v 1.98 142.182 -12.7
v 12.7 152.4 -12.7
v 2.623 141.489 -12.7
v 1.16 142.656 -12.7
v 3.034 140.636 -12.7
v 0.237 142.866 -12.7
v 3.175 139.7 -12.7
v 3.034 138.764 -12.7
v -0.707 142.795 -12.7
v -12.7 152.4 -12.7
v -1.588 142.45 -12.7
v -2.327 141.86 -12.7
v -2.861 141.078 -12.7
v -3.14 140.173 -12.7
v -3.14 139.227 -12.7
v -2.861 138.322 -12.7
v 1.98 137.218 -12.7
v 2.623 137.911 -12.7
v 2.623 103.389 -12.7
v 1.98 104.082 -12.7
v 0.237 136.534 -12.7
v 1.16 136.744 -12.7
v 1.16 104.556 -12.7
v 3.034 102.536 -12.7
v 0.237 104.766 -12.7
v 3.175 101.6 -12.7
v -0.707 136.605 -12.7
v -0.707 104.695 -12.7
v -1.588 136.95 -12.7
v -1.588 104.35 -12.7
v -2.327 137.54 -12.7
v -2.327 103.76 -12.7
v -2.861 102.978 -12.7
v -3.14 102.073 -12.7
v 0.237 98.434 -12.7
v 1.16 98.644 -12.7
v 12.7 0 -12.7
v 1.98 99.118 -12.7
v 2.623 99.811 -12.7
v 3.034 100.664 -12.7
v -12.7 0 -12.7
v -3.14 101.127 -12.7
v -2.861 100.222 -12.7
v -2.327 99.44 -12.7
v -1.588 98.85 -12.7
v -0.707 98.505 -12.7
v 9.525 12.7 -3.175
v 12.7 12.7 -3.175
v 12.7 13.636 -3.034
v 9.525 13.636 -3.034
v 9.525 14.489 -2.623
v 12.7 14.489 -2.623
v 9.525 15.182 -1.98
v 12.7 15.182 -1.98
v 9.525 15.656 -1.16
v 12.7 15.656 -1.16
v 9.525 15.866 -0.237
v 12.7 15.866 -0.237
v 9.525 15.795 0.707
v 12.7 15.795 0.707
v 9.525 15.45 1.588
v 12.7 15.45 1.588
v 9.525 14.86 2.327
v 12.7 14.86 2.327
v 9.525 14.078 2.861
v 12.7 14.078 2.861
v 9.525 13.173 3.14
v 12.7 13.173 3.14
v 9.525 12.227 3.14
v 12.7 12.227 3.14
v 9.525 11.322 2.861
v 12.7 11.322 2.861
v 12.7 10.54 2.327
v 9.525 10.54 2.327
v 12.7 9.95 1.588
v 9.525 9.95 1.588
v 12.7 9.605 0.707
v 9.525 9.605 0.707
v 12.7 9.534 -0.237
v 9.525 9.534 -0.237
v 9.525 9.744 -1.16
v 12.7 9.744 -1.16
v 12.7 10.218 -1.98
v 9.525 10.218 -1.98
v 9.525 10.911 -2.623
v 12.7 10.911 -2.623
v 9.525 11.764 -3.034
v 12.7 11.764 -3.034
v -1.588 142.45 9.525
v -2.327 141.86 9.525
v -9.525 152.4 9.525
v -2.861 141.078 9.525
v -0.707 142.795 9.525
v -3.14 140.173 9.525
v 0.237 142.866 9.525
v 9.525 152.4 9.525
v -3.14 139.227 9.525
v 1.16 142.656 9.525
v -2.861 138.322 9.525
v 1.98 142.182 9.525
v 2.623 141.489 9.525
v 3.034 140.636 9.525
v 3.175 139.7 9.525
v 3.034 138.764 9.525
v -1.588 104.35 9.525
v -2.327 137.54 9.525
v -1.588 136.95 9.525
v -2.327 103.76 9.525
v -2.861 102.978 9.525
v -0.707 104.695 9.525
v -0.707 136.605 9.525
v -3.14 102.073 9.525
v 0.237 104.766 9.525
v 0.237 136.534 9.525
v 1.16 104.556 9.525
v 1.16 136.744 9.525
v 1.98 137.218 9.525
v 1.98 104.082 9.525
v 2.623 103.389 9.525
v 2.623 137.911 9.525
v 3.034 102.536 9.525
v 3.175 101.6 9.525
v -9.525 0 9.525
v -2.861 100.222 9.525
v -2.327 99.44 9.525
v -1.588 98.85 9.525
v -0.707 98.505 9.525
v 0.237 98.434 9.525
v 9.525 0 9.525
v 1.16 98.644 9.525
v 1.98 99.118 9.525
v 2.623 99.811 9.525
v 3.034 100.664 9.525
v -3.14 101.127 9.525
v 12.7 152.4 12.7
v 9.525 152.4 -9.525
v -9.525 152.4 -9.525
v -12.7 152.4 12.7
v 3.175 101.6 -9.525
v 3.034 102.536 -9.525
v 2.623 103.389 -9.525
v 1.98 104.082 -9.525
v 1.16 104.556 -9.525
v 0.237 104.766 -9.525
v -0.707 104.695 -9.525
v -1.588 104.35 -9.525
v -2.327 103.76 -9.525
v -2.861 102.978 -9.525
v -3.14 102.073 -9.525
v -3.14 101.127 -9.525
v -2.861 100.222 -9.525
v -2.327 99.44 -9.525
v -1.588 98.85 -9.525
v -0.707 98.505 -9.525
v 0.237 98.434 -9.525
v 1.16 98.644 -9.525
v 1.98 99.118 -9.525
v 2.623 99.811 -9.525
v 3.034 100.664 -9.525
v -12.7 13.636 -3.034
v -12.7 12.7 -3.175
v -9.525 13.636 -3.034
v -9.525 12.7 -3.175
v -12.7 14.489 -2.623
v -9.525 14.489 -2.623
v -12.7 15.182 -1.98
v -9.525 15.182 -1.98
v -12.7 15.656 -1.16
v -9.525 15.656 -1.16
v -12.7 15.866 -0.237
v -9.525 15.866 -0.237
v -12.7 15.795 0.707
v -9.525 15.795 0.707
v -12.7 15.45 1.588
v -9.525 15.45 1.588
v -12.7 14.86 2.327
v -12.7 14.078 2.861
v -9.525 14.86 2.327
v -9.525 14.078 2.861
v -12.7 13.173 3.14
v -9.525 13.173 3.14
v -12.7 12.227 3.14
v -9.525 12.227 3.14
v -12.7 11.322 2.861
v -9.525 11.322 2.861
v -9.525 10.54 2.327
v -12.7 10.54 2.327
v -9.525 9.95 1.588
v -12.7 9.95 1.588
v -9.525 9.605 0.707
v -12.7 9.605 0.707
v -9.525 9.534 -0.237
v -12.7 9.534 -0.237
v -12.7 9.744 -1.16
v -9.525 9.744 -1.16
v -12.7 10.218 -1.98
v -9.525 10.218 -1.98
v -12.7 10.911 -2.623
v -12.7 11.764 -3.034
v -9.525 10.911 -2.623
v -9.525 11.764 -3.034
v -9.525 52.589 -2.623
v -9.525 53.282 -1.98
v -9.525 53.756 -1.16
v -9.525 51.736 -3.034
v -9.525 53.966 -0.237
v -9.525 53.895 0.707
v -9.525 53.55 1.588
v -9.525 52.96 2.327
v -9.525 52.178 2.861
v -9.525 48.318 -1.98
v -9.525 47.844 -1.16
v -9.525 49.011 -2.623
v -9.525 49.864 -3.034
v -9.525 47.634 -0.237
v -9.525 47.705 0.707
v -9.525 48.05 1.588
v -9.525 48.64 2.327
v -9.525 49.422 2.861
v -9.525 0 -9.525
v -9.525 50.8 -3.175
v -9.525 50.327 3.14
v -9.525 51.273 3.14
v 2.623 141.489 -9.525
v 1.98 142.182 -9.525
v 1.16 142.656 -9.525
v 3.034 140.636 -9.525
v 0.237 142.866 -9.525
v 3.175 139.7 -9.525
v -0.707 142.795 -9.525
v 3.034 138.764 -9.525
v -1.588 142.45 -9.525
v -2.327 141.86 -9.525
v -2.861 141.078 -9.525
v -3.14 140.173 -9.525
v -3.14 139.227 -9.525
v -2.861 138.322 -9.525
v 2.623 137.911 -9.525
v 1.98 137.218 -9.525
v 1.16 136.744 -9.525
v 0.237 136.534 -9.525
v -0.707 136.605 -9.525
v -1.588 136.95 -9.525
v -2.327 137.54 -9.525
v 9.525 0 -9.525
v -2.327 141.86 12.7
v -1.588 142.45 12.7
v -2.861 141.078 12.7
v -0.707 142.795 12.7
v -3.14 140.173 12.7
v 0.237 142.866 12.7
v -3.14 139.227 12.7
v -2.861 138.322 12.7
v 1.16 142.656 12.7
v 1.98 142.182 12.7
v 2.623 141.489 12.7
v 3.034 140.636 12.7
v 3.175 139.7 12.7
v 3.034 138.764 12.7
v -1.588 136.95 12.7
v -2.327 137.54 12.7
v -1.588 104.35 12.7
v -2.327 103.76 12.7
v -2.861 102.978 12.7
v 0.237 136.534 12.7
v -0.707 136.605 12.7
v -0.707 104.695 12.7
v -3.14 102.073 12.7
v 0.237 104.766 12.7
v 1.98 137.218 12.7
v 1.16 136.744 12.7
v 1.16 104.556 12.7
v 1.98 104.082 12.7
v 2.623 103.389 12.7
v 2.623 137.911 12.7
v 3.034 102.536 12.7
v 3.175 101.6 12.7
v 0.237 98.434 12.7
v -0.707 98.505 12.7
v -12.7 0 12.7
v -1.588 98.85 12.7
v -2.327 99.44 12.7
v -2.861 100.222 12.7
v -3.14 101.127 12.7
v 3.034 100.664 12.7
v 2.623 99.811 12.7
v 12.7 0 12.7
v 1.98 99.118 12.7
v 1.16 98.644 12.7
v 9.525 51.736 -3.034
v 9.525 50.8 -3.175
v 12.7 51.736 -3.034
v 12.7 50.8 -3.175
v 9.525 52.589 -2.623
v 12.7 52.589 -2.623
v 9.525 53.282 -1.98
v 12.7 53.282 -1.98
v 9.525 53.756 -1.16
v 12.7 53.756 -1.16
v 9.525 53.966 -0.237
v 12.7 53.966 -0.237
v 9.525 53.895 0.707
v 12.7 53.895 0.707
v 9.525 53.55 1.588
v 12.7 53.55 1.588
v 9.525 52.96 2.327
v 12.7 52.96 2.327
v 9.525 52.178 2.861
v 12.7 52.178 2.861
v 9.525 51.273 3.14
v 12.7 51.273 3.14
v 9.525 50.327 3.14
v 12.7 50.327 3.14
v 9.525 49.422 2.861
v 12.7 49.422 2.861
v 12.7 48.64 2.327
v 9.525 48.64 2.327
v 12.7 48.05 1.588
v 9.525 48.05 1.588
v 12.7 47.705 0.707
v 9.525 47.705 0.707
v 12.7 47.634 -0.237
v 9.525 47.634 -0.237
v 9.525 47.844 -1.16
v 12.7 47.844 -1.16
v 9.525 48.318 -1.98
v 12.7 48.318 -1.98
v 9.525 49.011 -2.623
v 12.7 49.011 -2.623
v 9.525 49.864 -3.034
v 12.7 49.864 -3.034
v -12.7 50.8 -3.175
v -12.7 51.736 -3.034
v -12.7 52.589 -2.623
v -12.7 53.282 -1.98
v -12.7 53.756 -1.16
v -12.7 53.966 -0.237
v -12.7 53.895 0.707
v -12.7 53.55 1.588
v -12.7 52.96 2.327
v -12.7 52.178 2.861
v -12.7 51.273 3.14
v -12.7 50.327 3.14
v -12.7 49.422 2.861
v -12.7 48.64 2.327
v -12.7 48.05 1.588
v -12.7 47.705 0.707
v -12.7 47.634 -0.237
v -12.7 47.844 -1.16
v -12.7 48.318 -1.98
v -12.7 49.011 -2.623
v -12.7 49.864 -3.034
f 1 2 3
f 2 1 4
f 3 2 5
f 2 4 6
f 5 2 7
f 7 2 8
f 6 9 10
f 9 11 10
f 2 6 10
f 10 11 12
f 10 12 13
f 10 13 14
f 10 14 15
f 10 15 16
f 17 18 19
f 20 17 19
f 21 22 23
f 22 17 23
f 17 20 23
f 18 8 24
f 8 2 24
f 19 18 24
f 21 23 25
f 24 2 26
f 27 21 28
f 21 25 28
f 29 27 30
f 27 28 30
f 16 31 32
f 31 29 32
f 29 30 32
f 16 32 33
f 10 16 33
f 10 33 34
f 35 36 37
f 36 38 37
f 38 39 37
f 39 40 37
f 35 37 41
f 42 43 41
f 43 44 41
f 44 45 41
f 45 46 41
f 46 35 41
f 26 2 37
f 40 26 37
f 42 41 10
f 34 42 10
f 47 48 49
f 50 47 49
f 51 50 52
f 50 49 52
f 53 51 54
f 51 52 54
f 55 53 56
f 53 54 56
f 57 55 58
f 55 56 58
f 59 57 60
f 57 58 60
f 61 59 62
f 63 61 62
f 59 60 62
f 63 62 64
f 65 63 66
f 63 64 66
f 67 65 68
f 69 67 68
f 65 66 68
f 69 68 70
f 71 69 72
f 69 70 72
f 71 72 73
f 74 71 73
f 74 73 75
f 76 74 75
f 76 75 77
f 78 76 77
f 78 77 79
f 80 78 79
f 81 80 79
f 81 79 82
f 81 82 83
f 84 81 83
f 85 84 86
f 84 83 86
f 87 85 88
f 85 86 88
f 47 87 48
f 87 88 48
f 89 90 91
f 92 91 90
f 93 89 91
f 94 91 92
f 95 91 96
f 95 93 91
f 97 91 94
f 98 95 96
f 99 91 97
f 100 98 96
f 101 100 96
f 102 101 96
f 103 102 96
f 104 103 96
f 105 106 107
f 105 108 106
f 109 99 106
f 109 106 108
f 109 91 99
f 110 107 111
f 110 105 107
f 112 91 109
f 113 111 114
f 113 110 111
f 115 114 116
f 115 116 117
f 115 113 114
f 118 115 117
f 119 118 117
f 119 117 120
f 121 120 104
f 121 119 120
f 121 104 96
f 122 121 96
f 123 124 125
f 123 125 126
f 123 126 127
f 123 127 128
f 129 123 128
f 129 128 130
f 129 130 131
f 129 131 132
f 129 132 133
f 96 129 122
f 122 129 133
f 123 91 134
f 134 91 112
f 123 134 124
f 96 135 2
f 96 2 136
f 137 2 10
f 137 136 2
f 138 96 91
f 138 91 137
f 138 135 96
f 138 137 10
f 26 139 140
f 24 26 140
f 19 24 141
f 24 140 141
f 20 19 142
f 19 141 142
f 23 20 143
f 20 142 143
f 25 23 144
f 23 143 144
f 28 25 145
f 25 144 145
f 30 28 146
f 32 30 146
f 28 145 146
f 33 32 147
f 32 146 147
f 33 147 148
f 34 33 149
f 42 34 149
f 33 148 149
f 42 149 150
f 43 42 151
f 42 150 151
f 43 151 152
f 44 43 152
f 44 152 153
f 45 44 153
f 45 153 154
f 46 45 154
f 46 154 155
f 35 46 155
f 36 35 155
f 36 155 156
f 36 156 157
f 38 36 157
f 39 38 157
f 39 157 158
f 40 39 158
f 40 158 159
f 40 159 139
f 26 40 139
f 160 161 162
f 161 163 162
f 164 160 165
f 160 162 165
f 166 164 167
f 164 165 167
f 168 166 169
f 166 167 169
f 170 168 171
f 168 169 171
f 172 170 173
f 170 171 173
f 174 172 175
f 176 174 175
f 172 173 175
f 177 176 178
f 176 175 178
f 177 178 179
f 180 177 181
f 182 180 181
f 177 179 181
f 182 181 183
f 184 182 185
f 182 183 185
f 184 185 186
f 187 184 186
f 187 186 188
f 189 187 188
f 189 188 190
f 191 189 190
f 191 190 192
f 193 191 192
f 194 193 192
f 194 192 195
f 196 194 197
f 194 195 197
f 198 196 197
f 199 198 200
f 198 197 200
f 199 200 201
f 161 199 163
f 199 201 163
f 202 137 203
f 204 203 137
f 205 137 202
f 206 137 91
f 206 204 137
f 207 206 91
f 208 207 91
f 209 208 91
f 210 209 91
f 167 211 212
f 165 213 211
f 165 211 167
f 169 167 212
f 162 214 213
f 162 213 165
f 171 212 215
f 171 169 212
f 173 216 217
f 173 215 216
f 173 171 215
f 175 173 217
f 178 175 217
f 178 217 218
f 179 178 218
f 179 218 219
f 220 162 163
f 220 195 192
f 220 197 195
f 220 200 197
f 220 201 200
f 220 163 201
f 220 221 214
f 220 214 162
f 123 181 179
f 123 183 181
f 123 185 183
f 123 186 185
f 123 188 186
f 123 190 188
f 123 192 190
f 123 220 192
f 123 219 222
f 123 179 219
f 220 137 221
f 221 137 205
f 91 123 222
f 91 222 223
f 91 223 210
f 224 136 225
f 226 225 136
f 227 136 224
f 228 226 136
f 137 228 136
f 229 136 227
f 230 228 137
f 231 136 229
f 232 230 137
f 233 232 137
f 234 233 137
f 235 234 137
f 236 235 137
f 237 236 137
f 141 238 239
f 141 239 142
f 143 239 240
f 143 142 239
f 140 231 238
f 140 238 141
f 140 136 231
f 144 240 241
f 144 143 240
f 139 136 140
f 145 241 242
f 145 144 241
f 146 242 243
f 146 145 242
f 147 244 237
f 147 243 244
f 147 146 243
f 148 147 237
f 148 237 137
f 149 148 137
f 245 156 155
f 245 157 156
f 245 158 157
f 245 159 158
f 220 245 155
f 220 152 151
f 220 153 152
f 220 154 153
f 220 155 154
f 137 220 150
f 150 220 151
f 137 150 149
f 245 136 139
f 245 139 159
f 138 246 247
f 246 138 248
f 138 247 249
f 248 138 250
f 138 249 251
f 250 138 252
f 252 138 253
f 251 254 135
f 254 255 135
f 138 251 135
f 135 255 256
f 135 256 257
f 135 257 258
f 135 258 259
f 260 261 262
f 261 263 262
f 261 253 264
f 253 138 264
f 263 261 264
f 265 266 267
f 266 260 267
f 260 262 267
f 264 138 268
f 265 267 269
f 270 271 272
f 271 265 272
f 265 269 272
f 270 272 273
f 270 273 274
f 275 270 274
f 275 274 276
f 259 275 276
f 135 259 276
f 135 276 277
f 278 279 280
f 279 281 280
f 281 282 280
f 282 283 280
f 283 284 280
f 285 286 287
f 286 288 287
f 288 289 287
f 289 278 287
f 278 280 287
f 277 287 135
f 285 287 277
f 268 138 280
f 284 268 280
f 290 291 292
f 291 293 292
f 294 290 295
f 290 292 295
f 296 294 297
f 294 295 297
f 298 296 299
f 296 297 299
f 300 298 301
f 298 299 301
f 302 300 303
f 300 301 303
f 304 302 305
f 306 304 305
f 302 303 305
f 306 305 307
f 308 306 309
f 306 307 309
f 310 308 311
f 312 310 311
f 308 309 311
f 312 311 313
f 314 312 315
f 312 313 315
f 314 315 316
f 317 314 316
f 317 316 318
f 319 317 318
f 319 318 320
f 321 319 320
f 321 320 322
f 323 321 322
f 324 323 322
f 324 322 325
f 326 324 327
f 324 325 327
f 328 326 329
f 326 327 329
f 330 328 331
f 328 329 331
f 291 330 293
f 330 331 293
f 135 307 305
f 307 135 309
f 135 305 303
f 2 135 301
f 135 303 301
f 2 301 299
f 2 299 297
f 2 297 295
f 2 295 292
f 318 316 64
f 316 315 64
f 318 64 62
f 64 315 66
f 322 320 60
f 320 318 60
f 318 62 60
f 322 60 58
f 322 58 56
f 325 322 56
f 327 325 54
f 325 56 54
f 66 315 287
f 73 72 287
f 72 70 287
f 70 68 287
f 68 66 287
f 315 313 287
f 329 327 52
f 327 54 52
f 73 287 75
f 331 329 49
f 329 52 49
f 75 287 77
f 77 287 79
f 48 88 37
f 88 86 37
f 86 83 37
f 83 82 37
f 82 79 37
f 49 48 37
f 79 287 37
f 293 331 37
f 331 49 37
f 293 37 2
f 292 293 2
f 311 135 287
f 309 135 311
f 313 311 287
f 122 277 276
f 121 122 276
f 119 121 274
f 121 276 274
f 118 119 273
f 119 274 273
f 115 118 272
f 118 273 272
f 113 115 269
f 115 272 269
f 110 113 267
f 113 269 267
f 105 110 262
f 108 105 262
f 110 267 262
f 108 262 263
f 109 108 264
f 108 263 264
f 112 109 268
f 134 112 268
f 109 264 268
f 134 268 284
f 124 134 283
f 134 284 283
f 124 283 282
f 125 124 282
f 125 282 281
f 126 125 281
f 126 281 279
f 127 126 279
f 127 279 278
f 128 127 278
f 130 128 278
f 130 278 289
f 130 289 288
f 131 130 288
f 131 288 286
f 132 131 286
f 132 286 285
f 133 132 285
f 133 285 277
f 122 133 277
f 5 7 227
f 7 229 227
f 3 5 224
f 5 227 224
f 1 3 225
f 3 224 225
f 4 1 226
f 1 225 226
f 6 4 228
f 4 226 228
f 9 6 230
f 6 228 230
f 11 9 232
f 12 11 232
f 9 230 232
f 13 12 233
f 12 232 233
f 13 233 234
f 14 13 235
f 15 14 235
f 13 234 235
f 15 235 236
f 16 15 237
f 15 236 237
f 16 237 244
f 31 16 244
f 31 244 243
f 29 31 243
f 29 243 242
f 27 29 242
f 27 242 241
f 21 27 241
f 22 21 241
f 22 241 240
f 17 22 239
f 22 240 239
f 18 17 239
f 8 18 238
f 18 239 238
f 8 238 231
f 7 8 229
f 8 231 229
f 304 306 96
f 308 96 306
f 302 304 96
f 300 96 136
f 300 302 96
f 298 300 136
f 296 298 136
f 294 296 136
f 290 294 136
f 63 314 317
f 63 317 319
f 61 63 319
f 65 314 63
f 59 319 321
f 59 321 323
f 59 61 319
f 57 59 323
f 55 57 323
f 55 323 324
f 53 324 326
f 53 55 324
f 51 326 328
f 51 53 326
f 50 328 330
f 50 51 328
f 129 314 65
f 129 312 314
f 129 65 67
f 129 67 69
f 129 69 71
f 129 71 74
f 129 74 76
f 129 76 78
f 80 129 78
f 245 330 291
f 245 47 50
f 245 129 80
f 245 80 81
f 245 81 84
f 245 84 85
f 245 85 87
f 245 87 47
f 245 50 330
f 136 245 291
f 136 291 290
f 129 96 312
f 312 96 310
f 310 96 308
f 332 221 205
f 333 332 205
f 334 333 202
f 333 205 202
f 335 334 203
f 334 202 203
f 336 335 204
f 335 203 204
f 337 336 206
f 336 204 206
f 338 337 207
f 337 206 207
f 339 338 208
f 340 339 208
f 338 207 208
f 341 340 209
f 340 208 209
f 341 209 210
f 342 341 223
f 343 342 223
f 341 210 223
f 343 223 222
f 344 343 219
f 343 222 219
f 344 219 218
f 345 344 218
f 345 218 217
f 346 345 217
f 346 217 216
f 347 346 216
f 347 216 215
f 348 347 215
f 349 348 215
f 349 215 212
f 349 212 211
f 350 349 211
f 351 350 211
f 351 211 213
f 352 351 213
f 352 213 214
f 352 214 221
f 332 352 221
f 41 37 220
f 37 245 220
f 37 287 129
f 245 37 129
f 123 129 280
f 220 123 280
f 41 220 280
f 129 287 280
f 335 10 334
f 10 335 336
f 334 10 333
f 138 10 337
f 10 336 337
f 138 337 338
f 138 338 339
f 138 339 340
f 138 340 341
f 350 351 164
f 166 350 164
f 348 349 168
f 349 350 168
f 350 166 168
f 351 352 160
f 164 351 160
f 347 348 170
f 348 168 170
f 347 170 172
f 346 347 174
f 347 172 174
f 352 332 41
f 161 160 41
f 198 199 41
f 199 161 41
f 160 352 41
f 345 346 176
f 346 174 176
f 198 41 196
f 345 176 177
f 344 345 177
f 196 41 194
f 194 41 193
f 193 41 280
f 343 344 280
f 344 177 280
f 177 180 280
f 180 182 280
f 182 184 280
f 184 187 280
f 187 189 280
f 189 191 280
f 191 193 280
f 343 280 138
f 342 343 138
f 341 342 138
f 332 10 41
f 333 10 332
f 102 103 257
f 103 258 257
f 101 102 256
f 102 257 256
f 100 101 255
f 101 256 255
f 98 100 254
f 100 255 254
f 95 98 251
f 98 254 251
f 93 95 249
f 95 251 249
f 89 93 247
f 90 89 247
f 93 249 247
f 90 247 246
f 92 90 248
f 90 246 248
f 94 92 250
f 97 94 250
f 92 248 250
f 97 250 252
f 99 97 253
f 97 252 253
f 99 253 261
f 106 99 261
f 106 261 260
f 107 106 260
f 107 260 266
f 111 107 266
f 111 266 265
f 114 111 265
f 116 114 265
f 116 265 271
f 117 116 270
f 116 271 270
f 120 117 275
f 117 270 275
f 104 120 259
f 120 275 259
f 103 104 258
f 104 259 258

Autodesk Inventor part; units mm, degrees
ref_plane "YZ Plane" through (0, 0, 0) normal (1, 0, 0) x (0, 1, 0)
ref_plane "XZ Plane" through (0, 0, 0) normal (0, 1, 0) x (-1, 0, 0)
ref_plane "XY Plane" through (0, 0, 0) normal (0, 0, 1) x (1, 0, 0)
sketch "Sketch1" plane through (0, 0, 0) normal (0, 1, 0) x (-1, 0, 0)
  line L0 (-12.7, -12.7) -> (12.7, -12.7)
  line L1 (12.7, -12.7) -> (12.7, 12.7)
  line L2 (12.7, 12.7) -> (-12.7, 12.7)
  line L3 (-12.7, 12.7) -> (-12.7, -12.7)
  line L4 (-12.7, -12.7) -> (12.7, 12.7) construction
  line L5 (12.7, -12.7) -> (-12.7, 12.7) construction
  line L6 (-9.525, -9.525) -> (9.525, -9.525)
  line L7 (9.525, -9.525) -> (9.525, 9.525)
  line L8 (9.525, 9.525) -> (-9.525, 9.525)
  line L9 (-9.525, 9.525) -> (-9.525, -9.525)
  line L10 (-9.525, -9.525) -> (9.525, 9.525) construction
  line L11 (9.525, -9.525) -> (-9.525, 9.525) construction
  point P0 (0, 0)
  dimension "d0" = 25.4
  dimension "d1" = 25.4
  dimension "d2" = 19.05
  dimension "d3" = 19.05
extrude "Extrusion1" add sketch "Sketch1" along normal blind 152.4
sketch "Sketch2" plane through (-12.7, 0, 12.7) normal (0, 0, 1) x (1, 0, 0)
  line L0 (0, 152.4) -> (25.4, 152.4) projected
  line L1 (0, 0) -> (0, 152.4) projected
  line L2 (12.7, 152.4) -> (12.7, 139.7)
  line L3 (12.7, 139.7) -> (12.7, 101.6)
  circle A0 centre (12.7, 139.7) radius 3.175
  circle A1 centre (12.7, 101.6) radius 3.175
  point P0 (12.7, 0)
  dimension "d6" = 12.7
  dimension "d7" = 38.1
  dimension "d8" = 180
  dimension "d9" = 6.35
  dimension "d10" = 6.35
extrude "Extrusion2" cut sketch "Sketch2" against normal blind 25.4
sketch "Sketch3" plane through (12.7, 0, 12.7) normal (1, 0, 0) x (0, 0, -1)
  line L0 (0, 0) -> (0, 152.4) projected
  line L1 (12.7, 0) -> (12.7, 12.7)
  line L2 (12.7, 0) -> (25.4, 0) construction
  line L3 (12.7, 12.7) -> (12.7, 50.8)
  line L4 (12.7, 12.7) -> (50.8, 12.7) construction
  circle A0 centre (12.7, 50.8) radius 3.175
  circle A1 centre (12.7, 12.7) radius 3.175
  dimension "d13" = 12.7
  dimension "d14" = 90
  dimension "d15" = 38.1
  dimension "d16" = 90
  dimension "d17" = 6.35
  dimension "d18" = 6.35
extrude "Extrusion3" cut sketch "Sketch3" against normal blind 25.4
properties part number "SuperStructureSupport"
